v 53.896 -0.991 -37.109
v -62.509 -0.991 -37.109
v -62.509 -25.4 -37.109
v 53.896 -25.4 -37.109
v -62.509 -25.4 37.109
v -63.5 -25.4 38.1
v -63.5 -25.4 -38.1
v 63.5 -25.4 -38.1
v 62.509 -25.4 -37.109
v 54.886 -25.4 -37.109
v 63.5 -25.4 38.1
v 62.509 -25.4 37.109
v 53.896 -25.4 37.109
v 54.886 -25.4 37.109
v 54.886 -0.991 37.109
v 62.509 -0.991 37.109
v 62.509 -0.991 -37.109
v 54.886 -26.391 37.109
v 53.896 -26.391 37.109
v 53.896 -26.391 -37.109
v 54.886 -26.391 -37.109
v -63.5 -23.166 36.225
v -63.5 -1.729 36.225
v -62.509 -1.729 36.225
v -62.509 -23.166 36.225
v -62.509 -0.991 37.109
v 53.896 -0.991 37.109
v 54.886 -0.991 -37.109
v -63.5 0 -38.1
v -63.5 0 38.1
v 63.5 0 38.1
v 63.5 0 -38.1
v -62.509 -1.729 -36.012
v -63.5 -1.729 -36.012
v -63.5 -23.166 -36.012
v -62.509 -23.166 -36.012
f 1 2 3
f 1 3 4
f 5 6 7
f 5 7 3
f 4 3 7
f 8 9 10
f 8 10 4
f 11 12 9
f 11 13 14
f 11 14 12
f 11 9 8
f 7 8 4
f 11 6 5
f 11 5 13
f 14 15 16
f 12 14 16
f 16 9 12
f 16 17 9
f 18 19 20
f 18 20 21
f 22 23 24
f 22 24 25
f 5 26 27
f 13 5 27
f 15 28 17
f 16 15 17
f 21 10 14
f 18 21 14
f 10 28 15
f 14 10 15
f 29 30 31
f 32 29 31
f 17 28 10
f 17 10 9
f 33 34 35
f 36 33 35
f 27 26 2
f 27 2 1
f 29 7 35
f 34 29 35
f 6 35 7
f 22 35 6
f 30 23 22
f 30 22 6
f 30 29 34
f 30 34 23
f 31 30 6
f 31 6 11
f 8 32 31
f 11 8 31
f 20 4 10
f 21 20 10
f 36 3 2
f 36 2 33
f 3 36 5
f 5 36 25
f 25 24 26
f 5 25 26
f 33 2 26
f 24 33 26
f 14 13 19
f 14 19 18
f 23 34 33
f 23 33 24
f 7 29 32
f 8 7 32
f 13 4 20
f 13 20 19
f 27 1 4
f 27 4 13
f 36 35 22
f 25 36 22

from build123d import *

# Parameters (mm, degrees)
F0_W     = 127
F0_H     = 76.2
F1_DEPTH = 25.4
F2_T     = -0.9906
F3_W     = 0.9906
F3_H     = 74.2188
F4_DEPTH = 25.4
F5_W     = 21.4376
F5_H     = 72.2376
F6_DEPTH = 25.4


with BuildPart() as f1:
    # F0 (on Front) → F1 (new body)
    with BuildSketch(Plane.XZ):
        Rectangle(F0_W, F0_H)
    extrude(amount=F1_DEPTH)

    # F2
    f2_openings = [f1.faces().sort_by_distance(p)[0] for p in [
        (0, -25.4, 0),
    ]]
    offset(amount=F2_T, openings=f2_openings)

    # F3 (on face) → F4 (join)
    with BuildSketch(Plane.XZ.offset(0.9906)):
        with Locations((54.391131, 0)):
            Rectangle(F3_W, F3_H)
    extrude(amount=F4_DEPTH)

    # F5 (on face) → F6 (cut)
    with BuildSketch(Plane(origin=(-63.5, 0, 0), x_dir=(0, -1, 0), z_dir=(-1, 0, 0))):
        with Locations((12.447563, 0.106448)):
            Rectangle(F5_W, F5_H)
    extrude(amount=-F6_DEPTH, mode=Mode.SUBTRACT)


solid = f1.part
